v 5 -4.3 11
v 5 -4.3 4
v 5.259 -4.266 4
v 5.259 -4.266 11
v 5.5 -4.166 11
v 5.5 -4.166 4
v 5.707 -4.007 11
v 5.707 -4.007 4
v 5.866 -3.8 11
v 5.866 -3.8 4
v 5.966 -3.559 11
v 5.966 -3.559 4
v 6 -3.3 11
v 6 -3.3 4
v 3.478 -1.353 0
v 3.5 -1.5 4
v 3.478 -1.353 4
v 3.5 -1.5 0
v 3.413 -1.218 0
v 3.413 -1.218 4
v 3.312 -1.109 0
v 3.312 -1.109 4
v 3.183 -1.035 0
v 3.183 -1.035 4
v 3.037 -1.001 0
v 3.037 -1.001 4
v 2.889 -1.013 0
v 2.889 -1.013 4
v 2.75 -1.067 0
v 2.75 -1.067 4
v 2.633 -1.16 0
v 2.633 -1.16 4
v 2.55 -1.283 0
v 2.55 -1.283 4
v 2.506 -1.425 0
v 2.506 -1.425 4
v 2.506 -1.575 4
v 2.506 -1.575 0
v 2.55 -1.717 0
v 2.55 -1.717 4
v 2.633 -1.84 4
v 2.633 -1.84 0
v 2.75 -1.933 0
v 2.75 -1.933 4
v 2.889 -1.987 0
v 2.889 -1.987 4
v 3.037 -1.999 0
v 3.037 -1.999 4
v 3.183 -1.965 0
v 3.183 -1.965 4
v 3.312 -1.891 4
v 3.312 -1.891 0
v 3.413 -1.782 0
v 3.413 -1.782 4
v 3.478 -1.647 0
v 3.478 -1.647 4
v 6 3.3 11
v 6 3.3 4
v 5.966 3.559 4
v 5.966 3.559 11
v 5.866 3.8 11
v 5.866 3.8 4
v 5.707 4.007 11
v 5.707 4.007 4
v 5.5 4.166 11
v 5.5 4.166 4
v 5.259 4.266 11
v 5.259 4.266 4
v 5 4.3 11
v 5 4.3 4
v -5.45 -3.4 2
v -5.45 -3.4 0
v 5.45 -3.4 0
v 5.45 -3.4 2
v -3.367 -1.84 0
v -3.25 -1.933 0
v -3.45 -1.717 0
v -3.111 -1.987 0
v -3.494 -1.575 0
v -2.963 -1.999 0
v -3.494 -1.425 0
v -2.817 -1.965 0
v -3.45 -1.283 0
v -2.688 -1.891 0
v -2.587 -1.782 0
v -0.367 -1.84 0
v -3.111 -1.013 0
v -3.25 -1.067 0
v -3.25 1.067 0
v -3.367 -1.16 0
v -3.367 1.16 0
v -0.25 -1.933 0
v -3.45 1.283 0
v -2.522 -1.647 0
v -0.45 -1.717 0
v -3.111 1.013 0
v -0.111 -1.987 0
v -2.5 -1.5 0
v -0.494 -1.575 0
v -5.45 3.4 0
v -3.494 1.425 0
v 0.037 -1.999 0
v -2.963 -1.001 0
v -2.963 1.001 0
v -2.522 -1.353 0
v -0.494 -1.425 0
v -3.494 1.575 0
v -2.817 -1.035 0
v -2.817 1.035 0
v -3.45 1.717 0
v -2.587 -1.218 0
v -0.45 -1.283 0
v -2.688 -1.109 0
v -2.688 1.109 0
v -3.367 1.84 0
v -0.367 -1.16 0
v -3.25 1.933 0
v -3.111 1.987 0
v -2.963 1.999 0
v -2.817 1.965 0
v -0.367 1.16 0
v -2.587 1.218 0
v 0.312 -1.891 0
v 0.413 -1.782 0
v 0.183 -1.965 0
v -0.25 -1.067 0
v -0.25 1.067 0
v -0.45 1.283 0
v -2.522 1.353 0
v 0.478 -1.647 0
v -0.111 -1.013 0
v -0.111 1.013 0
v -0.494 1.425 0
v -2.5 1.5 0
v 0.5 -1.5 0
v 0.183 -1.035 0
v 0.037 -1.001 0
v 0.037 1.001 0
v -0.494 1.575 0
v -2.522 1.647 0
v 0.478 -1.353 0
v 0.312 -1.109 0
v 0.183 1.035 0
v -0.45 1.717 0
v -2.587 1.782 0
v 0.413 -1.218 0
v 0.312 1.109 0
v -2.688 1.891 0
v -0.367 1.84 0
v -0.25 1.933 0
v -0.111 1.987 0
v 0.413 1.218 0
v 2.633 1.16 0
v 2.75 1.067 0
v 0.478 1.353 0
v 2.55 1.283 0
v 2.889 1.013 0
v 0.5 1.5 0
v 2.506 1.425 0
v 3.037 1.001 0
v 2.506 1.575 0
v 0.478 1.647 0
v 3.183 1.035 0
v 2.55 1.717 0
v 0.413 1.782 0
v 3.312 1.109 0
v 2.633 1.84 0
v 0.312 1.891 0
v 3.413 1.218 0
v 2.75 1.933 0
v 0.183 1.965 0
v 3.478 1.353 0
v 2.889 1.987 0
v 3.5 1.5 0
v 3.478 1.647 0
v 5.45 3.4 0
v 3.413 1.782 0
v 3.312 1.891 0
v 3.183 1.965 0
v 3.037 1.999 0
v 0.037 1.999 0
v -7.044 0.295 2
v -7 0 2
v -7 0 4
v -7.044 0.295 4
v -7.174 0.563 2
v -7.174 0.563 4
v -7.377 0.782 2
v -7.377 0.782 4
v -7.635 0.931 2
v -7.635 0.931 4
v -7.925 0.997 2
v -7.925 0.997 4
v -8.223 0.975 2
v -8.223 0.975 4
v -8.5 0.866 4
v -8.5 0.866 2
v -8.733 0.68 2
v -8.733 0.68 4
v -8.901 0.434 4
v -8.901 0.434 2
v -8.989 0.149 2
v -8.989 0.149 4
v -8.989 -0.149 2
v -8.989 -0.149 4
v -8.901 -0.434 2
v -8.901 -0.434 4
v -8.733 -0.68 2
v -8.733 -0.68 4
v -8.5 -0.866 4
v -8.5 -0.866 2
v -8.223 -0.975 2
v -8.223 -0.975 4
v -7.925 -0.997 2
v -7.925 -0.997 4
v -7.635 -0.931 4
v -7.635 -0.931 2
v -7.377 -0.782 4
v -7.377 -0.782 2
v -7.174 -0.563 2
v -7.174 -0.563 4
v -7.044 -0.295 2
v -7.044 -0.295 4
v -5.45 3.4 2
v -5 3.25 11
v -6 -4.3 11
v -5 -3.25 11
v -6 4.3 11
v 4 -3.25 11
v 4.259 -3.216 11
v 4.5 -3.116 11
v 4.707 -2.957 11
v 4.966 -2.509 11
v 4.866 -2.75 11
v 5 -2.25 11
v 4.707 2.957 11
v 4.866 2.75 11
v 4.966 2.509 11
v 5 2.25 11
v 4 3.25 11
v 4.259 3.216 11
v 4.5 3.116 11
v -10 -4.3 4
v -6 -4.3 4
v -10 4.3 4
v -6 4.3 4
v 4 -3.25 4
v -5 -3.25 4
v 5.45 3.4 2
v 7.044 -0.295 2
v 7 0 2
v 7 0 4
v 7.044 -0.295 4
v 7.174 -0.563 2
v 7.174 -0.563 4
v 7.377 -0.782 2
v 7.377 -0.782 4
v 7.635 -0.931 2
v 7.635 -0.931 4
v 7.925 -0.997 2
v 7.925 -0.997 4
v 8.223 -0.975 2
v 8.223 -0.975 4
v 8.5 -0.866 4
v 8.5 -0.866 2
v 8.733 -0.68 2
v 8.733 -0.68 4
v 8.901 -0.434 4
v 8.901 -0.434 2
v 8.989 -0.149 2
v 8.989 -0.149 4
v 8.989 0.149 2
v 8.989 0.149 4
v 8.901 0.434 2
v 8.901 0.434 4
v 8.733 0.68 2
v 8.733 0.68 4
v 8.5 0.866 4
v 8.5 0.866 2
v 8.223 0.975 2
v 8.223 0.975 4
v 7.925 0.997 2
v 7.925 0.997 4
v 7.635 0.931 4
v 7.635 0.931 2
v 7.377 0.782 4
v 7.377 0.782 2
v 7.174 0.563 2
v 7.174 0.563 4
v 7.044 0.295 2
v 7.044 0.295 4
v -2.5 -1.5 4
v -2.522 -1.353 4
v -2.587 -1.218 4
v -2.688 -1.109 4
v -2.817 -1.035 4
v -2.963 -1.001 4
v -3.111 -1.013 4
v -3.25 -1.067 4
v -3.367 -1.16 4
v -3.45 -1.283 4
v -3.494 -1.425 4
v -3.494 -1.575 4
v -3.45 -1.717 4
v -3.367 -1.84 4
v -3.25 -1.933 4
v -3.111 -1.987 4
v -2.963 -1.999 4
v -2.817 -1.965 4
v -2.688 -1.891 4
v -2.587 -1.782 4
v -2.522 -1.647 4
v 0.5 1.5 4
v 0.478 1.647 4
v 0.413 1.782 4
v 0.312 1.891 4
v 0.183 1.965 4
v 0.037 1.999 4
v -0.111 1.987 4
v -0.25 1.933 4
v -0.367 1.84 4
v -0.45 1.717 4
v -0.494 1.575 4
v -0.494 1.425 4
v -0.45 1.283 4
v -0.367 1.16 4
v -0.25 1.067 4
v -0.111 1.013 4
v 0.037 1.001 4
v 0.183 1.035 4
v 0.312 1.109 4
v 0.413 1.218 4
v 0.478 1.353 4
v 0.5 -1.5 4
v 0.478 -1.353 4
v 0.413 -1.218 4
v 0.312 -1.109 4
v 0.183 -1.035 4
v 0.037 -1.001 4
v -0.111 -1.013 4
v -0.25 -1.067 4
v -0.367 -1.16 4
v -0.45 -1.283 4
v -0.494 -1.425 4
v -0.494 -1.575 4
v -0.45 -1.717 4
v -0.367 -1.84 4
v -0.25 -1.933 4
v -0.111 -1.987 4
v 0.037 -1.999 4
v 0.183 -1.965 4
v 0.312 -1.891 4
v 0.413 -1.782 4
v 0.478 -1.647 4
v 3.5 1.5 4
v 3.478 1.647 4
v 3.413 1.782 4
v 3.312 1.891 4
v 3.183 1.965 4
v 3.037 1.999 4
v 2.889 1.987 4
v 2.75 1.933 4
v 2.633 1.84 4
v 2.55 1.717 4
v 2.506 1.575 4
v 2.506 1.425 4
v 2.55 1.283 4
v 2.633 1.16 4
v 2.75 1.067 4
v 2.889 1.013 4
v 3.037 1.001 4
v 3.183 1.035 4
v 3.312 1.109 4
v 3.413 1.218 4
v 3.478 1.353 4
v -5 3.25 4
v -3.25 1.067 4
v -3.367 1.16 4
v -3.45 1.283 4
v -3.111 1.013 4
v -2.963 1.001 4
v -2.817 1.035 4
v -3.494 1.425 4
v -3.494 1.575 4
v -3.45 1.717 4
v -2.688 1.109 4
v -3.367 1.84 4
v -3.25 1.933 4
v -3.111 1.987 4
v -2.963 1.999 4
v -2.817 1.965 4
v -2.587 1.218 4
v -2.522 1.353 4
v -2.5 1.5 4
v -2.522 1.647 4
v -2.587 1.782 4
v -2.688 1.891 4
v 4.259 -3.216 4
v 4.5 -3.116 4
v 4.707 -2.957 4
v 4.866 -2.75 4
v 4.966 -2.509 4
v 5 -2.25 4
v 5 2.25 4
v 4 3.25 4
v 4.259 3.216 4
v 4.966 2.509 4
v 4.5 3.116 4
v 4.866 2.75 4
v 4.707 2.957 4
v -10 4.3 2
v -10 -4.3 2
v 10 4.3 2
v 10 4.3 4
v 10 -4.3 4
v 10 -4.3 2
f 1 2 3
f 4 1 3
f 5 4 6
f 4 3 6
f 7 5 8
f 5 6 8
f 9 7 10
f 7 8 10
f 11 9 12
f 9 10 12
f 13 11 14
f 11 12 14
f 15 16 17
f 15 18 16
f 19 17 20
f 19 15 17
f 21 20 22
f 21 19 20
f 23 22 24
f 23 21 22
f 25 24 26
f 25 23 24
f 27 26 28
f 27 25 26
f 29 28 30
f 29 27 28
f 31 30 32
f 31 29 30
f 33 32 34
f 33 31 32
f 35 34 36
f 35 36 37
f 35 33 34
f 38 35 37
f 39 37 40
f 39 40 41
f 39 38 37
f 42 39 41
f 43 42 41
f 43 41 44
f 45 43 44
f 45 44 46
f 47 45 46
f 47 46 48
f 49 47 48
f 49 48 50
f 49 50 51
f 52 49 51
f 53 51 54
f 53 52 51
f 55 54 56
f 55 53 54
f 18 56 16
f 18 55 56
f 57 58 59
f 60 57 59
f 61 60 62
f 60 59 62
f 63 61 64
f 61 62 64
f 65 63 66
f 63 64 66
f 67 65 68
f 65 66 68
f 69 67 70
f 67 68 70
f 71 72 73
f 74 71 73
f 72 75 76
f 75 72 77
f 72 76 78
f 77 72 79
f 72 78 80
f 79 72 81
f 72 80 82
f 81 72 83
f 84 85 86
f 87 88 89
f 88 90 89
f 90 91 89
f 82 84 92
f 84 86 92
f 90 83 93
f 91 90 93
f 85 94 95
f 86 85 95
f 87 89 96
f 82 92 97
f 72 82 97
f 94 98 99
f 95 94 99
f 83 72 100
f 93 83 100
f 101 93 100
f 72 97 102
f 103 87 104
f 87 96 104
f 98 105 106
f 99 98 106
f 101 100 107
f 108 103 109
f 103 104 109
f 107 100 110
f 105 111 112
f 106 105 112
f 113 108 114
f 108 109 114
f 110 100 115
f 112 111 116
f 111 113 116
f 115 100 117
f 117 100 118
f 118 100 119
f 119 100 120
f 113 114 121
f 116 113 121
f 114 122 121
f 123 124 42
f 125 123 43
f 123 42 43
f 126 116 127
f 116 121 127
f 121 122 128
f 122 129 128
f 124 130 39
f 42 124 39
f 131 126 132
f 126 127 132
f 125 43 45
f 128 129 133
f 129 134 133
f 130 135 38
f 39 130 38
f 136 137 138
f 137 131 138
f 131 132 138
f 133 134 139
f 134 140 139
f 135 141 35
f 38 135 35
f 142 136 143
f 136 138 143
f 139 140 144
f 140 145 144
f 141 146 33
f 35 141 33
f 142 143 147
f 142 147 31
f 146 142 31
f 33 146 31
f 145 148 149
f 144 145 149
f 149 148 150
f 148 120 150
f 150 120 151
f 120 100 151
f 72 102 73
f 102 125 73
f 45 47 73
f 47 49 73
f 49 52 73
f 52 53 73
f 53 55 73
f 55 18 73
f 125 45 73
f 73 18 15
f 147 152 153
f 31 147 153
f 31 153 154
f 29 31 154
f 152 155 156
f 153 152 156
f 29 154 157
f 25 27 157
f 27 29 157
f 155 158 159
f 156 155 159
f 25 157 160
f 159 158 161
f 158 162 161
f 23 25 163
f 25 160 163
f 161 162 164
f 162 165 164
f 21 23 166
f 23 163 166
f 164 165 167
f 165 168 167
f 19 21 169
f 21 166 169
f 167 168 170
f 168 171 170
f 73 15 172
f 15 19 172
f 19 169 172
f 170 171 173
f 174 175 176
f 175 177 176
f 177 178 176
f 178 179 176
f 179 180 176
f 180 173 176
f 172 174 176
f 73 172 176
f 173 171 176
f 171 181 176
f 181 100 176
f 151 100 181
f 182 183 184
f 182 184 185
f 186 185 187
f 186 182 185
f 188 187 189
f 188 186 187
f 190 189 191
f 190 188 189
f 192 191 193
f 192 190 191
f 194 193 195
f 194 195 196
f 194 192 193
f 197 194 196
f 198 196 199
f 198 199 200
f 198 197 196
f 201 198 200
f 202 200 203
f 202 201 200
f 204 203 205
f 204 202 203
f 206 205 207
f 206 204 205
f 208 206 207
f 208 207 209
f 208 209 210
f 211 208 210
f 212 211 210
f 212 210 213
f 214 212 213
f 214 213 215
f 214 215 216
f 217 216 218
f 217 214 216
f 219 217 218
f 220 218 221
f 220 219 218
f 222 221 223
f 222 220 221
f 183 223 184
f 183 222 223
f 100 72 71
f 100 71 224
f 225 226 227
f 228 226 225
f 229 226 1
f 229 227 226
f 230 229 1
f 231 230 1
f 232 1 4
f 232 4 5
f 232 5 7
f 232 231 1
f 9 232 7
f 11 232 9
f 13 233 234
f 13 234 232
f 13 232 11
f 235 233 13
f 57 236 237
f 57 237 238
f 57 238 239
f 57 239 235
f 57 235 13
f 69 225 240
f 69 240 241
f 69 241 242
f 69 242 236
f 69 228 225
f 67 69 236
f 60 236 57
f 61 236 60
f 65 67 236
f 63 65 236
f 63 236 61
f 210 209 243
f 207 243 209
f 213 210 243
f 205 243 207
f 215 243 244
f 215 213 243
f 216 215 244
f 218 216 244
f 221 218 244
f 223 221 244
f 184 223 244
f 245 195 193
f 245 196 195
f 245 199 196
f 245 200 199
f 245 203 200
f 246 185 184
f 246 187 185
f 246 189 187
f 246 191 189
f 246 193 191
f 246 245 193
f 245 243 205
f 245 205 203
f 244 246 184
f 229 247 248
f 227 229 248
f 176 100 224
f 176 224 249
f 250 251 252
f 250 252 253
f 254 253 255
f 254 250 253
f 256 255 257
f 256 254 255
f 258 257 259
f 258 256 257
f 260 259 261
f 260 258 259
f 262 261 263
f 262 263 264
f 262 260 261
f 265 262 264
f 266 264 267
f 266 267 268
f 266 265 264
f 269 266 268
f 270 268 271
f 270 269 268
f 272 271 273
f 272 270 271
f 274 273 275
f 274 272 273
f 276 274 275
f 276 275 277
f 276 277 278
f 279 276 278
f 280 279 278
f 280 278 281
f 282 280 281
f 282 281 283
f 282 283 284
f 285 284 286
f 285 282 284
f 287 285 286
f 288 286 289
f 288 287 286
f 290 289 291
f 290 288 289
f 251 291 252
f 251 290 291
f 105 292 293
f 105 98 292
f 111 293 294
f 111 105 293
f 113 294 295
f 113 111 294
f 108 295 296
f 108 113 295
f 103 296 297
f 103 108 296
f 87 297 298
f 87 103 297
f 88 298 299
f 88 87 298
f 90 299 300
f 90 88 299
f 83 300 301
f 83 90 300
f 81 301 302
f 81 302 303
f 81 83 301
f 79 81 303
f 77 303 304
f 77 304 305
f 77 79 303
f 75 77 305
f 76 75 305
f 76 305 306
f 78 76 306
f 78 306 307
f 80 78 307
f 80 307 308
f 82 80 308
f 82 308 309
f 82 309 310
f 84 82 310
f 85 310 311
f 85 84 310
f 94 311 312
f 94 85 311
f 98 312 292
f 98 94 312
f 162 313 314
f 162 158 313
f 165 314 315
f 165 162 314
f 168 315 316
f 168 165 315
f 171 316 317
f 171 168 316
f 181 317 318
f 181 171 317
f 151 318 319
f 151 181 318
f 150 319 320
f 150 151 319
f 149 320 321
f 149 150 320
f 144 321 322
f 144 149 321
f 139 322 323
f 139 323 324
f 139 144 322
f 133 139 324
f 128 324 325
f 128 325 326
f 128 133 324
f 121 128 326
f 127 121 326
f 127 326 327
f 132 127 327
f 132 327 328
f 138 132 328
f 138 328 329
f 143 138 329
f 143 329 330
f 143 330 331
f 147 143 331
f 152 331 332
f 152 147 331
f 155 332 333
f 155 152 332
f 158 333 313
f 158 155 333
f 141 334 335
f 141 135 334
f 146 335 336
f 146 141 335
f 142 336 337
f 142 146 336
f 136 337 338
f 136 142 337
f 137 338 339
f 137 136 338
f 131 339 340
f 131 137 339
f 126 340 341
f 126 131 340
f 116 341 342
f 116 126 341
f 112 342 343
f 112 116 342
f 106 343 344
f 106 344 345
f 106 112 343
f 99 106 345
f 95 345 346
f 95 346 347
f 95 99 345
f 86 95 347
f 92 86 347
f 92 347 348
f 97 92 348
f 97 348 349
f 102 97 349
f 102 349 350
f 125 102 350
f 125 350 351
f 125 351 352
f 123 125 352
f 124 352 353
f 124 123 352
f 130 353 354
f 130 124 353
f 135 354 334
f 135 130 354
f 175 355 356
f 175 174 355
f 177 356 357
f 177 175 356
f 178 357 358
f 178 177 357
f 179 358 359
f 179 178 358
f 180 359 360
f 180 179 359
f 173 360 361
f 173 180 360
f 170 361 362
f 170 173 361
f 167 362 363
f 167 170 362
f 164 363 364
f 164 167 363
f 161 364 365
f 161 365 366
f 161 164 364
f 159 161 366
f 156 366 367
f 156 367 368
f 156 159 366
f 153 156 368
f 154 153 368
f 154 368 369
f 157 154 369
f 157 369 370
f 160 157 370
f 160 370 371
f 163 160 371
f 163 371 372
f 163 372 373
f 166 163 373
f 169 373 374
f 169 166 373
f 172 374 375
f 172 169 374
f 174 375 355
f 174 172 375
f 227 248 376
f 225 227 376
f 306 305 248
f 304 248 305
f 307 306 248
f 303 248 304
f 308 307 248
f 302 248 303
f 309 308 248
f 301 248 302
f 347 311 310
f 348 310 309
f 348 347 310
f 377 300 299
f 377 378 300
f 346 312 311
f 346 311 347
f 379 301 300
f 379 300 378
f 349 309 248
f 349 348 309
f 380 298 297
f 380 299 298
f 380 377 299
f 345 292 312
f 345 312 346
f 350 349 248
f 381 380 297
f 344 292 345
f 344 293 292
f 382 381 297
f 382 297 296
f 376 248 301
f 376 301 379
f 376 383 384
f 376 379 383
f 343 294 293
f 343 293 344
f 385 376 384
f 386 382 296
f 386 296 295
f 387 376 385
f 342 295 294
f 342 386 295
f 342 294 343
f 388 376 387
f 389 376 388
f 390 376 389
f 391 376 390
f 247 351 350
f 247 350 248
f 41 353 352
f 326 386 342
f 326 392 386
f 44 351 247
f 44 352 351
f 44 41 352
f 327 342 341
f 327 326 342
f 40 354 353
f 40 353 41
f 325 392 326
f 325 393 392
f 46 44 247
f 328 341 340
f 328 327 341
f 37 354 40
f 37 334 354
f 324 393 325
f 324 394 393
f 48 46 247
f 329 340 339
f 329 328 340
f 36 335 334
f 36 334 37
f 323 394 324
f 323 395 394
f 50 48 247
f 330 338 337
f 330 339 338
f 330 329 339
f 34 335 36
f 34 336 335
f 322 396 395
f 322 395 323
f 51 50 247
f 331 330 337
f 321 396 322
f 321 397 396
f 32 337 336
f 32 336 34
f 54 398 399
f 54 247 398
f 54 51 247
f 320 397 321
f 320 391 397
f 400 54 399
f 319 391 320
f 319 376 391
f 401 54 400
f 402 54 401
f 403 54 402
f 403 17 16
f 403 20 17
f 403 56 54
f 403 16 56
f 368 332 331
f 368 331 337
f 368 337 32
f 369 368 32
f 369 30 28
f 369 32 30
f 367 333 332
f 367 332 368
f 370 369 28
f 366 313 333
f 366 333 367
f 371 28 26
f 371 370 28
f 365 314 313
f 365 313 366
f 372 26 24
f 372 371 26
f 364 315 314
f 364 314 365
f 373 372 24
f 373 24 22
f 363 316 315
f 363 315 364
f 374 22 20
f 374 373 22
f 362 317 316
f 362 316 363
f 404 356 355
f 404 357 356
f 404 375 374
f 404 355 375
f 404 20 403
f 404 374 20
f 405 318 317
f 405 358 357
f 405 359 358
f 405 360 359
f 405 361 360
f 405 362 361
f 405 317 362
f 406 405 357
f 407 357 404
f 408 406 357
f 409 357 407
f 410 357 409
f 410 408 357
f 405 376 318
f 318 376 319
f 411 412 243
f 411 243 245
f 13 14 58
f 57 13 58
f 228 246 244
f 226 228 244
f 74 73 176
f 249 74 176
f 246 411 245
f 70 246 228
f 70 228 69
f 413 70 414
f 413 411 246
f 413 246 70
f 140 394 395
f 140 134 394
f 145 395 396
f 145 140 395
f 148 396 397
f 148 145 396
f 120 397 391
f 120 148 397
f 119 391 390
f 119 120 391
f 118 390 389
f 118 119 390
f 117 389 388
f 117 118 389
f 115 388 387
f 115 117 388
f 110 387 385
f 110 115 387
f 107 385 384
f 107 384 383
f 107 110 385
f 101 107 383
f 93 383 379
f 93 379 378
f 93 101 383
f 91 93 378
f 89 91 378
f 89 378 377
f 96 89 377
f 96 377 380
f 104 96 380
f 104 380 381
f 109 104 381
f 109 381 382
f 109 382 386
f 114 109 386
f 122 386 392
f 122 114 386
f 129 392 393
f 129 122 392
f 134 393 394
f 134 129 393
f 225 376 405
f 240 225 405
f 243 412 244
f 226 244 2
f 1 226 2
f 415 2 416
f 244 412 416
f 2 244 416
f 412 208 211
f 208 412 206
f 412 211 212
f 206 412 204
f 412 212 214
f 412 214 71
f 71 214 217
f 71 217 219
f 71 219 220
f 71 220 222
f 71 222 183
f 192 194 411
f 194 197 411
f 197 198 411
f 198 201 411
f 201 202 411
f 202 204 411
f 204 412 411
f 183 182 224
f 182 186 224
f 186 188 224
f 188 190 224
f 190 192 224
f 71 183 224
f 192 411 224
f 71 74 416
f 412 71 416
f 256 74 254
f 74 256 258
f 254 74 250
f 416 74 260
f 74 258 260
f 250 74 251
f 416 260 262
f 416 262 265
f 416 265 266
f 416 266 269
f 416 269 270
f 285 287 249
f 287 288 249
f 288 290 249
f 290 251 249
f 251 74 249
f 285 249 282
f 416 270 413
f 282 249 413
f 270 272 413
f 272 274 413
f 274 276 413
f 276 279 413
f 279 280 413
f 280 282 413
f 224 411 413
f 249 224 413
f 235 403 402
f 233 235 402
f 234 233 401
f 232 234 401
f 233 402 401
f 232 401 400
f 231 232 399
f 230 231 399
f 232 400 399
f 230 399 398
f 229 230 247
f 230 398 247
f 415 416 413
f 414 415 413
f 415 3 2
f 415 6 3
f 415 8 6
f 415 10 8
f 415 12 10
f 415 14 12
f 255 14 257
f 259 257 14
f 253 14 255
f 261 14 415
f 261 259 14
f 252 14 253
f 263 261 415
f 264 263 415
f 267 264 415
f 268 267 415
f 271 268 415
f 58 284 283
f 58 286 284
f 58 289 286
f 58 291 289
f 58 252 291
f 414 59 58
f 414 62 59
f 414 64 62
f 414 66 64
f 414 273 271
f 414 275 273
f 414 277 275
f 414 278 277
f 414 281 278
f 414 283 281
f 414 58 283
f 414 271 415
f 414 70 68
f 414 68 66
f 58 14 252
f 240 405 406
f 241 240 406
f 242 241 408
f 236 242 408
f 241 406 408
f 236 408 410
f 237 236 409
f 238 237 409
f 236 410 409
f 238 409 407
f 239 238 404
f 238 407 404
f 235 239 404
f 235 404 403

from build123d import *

# Parameters (mm, degrees)
SKETCH_1_W      = 10.9
SKETCH_1_H      = 6.8
SKETCH_1_R      = 0.5
EXTRUDE_1_DEPTH = 2
SKETCH_2_W      = 20
SKETCH_2_H      = 8.6
SKETCH_2_R      = 1
SKETCH_2_R_2    = 0.5
EXTRUDE_2_DEPTH = 2
EXTRUDE_3_DEPTH = 7


with BuildPart() as part:
    # 草图1 → 凸台-拉伸1 (new body)
    with BuildSketch(Plane.XY):
        Rectangle(SKETCH_1_W, SKETCH_1_H)
        with Locations((-3, 1.5)):
            Circle(SKETCH_1_R, mode=Mode.SUBTRACT)
        with Locations((0, 1.5)):
            Circle(SKETCH_1_R, mode=Mode.SUBTRACT)
        with Locations((3, 1.5)):
            Circle(SKETCH_1_R, mode=Mode.SUBTRACT)
        with Locations((0, -1.5)):
            Circle(SKETCH_1_R, mode=Mode.SUBTRACT)
        with Locations((3, -1.5)):
            Circle(SKETCH_1_R, mode=Mode.SUBTRACT)
        with Locations((-3, -1.5)):
            Circle(SKETCH_1_R, mode=Mode.SUBTRACT)
    extrude(amount=EXTRUDE_1_DEPTH)

    # 草图2 → 凸台-拉伸2 (add)
    with BuildSketch(Plane.XY.offset(2)):
        Rectangle(SKETCH_2_W, SKETCH_2_H)
        with Locations((-8, 0)):
            Circle(SKETCH_2_R, mode=Mode.SUBTRACT)
        with Locations(Location((8, 0, 0), (0, 0, 180))):
            Circle(SKETCH_2_R, mode=Mode.SUBTRACT)
        with Locations((3, 1.5)):
            Circle(SKETCH_2_R_2, mode=Mode.SUBTRACT)
        with Locations((3, -1.5)):
            Circle(SKETCH_2_R_2, mode=Mode.SUBTRACT)
        with Locations((0, -1.5)):
            Circle(SKETCH_2_R_2, mode=Mode.SUBTRACT)
        with Locations((0, 1.5)):
            Circle(SKETCH_2_R_2, mode=Mode.SUBTRACT)
        with Locations((-3, -1.5)):
            Circle(SKETCH_2_R_2, mode=Mode.SUBTRACT)
        with Locations((-3, 1.5)):
            Circle(SKETCH_2_R_2, mode=Mode.SUBTRACT)
    extrude(amount=EXTRUDE_2_DEPTH)

    # 草图3 → 凸台-拉伸3 (add)
    with BuildSketch(Plane.XY.offset(4)):
        with BuildLine():
            Line((5, 4.3), (-6, 4.3))
            Line((-6, 4.3), (-6, -4.3))
            Line((-6, -4.3), (5, -4.3))
            ThreePointArc((5, -4.3), (5.707106781, -4.007106781), (6, -3.3))
            Line((6, -3.3), (6, 3.3))
            ThreePointArc((6, 3.3), (5.707106781, 4.007106781), (5, 4.3))
        make_face()
        with BuildLine():
            Line((-5, -3.25), (-5, 3.25))
            Line((-5, 3.25), (4, 3.25))
            ThreePointArc((4, 3.25), (4.707106781, 2.957106781), (5, 2.25))
            Line((5, 2.25), (5, -2.25))
            ThreePointArc((5, -2.25), (4.707106781, -2.957106781), (4, -3.25))
            Line((4, -3.25), (-5, -3.25))
        make_face(mode=Mode.SUBTRACT)
    extrude(amount=EXTRUDE_3_DEPTH)


solid = part.part
